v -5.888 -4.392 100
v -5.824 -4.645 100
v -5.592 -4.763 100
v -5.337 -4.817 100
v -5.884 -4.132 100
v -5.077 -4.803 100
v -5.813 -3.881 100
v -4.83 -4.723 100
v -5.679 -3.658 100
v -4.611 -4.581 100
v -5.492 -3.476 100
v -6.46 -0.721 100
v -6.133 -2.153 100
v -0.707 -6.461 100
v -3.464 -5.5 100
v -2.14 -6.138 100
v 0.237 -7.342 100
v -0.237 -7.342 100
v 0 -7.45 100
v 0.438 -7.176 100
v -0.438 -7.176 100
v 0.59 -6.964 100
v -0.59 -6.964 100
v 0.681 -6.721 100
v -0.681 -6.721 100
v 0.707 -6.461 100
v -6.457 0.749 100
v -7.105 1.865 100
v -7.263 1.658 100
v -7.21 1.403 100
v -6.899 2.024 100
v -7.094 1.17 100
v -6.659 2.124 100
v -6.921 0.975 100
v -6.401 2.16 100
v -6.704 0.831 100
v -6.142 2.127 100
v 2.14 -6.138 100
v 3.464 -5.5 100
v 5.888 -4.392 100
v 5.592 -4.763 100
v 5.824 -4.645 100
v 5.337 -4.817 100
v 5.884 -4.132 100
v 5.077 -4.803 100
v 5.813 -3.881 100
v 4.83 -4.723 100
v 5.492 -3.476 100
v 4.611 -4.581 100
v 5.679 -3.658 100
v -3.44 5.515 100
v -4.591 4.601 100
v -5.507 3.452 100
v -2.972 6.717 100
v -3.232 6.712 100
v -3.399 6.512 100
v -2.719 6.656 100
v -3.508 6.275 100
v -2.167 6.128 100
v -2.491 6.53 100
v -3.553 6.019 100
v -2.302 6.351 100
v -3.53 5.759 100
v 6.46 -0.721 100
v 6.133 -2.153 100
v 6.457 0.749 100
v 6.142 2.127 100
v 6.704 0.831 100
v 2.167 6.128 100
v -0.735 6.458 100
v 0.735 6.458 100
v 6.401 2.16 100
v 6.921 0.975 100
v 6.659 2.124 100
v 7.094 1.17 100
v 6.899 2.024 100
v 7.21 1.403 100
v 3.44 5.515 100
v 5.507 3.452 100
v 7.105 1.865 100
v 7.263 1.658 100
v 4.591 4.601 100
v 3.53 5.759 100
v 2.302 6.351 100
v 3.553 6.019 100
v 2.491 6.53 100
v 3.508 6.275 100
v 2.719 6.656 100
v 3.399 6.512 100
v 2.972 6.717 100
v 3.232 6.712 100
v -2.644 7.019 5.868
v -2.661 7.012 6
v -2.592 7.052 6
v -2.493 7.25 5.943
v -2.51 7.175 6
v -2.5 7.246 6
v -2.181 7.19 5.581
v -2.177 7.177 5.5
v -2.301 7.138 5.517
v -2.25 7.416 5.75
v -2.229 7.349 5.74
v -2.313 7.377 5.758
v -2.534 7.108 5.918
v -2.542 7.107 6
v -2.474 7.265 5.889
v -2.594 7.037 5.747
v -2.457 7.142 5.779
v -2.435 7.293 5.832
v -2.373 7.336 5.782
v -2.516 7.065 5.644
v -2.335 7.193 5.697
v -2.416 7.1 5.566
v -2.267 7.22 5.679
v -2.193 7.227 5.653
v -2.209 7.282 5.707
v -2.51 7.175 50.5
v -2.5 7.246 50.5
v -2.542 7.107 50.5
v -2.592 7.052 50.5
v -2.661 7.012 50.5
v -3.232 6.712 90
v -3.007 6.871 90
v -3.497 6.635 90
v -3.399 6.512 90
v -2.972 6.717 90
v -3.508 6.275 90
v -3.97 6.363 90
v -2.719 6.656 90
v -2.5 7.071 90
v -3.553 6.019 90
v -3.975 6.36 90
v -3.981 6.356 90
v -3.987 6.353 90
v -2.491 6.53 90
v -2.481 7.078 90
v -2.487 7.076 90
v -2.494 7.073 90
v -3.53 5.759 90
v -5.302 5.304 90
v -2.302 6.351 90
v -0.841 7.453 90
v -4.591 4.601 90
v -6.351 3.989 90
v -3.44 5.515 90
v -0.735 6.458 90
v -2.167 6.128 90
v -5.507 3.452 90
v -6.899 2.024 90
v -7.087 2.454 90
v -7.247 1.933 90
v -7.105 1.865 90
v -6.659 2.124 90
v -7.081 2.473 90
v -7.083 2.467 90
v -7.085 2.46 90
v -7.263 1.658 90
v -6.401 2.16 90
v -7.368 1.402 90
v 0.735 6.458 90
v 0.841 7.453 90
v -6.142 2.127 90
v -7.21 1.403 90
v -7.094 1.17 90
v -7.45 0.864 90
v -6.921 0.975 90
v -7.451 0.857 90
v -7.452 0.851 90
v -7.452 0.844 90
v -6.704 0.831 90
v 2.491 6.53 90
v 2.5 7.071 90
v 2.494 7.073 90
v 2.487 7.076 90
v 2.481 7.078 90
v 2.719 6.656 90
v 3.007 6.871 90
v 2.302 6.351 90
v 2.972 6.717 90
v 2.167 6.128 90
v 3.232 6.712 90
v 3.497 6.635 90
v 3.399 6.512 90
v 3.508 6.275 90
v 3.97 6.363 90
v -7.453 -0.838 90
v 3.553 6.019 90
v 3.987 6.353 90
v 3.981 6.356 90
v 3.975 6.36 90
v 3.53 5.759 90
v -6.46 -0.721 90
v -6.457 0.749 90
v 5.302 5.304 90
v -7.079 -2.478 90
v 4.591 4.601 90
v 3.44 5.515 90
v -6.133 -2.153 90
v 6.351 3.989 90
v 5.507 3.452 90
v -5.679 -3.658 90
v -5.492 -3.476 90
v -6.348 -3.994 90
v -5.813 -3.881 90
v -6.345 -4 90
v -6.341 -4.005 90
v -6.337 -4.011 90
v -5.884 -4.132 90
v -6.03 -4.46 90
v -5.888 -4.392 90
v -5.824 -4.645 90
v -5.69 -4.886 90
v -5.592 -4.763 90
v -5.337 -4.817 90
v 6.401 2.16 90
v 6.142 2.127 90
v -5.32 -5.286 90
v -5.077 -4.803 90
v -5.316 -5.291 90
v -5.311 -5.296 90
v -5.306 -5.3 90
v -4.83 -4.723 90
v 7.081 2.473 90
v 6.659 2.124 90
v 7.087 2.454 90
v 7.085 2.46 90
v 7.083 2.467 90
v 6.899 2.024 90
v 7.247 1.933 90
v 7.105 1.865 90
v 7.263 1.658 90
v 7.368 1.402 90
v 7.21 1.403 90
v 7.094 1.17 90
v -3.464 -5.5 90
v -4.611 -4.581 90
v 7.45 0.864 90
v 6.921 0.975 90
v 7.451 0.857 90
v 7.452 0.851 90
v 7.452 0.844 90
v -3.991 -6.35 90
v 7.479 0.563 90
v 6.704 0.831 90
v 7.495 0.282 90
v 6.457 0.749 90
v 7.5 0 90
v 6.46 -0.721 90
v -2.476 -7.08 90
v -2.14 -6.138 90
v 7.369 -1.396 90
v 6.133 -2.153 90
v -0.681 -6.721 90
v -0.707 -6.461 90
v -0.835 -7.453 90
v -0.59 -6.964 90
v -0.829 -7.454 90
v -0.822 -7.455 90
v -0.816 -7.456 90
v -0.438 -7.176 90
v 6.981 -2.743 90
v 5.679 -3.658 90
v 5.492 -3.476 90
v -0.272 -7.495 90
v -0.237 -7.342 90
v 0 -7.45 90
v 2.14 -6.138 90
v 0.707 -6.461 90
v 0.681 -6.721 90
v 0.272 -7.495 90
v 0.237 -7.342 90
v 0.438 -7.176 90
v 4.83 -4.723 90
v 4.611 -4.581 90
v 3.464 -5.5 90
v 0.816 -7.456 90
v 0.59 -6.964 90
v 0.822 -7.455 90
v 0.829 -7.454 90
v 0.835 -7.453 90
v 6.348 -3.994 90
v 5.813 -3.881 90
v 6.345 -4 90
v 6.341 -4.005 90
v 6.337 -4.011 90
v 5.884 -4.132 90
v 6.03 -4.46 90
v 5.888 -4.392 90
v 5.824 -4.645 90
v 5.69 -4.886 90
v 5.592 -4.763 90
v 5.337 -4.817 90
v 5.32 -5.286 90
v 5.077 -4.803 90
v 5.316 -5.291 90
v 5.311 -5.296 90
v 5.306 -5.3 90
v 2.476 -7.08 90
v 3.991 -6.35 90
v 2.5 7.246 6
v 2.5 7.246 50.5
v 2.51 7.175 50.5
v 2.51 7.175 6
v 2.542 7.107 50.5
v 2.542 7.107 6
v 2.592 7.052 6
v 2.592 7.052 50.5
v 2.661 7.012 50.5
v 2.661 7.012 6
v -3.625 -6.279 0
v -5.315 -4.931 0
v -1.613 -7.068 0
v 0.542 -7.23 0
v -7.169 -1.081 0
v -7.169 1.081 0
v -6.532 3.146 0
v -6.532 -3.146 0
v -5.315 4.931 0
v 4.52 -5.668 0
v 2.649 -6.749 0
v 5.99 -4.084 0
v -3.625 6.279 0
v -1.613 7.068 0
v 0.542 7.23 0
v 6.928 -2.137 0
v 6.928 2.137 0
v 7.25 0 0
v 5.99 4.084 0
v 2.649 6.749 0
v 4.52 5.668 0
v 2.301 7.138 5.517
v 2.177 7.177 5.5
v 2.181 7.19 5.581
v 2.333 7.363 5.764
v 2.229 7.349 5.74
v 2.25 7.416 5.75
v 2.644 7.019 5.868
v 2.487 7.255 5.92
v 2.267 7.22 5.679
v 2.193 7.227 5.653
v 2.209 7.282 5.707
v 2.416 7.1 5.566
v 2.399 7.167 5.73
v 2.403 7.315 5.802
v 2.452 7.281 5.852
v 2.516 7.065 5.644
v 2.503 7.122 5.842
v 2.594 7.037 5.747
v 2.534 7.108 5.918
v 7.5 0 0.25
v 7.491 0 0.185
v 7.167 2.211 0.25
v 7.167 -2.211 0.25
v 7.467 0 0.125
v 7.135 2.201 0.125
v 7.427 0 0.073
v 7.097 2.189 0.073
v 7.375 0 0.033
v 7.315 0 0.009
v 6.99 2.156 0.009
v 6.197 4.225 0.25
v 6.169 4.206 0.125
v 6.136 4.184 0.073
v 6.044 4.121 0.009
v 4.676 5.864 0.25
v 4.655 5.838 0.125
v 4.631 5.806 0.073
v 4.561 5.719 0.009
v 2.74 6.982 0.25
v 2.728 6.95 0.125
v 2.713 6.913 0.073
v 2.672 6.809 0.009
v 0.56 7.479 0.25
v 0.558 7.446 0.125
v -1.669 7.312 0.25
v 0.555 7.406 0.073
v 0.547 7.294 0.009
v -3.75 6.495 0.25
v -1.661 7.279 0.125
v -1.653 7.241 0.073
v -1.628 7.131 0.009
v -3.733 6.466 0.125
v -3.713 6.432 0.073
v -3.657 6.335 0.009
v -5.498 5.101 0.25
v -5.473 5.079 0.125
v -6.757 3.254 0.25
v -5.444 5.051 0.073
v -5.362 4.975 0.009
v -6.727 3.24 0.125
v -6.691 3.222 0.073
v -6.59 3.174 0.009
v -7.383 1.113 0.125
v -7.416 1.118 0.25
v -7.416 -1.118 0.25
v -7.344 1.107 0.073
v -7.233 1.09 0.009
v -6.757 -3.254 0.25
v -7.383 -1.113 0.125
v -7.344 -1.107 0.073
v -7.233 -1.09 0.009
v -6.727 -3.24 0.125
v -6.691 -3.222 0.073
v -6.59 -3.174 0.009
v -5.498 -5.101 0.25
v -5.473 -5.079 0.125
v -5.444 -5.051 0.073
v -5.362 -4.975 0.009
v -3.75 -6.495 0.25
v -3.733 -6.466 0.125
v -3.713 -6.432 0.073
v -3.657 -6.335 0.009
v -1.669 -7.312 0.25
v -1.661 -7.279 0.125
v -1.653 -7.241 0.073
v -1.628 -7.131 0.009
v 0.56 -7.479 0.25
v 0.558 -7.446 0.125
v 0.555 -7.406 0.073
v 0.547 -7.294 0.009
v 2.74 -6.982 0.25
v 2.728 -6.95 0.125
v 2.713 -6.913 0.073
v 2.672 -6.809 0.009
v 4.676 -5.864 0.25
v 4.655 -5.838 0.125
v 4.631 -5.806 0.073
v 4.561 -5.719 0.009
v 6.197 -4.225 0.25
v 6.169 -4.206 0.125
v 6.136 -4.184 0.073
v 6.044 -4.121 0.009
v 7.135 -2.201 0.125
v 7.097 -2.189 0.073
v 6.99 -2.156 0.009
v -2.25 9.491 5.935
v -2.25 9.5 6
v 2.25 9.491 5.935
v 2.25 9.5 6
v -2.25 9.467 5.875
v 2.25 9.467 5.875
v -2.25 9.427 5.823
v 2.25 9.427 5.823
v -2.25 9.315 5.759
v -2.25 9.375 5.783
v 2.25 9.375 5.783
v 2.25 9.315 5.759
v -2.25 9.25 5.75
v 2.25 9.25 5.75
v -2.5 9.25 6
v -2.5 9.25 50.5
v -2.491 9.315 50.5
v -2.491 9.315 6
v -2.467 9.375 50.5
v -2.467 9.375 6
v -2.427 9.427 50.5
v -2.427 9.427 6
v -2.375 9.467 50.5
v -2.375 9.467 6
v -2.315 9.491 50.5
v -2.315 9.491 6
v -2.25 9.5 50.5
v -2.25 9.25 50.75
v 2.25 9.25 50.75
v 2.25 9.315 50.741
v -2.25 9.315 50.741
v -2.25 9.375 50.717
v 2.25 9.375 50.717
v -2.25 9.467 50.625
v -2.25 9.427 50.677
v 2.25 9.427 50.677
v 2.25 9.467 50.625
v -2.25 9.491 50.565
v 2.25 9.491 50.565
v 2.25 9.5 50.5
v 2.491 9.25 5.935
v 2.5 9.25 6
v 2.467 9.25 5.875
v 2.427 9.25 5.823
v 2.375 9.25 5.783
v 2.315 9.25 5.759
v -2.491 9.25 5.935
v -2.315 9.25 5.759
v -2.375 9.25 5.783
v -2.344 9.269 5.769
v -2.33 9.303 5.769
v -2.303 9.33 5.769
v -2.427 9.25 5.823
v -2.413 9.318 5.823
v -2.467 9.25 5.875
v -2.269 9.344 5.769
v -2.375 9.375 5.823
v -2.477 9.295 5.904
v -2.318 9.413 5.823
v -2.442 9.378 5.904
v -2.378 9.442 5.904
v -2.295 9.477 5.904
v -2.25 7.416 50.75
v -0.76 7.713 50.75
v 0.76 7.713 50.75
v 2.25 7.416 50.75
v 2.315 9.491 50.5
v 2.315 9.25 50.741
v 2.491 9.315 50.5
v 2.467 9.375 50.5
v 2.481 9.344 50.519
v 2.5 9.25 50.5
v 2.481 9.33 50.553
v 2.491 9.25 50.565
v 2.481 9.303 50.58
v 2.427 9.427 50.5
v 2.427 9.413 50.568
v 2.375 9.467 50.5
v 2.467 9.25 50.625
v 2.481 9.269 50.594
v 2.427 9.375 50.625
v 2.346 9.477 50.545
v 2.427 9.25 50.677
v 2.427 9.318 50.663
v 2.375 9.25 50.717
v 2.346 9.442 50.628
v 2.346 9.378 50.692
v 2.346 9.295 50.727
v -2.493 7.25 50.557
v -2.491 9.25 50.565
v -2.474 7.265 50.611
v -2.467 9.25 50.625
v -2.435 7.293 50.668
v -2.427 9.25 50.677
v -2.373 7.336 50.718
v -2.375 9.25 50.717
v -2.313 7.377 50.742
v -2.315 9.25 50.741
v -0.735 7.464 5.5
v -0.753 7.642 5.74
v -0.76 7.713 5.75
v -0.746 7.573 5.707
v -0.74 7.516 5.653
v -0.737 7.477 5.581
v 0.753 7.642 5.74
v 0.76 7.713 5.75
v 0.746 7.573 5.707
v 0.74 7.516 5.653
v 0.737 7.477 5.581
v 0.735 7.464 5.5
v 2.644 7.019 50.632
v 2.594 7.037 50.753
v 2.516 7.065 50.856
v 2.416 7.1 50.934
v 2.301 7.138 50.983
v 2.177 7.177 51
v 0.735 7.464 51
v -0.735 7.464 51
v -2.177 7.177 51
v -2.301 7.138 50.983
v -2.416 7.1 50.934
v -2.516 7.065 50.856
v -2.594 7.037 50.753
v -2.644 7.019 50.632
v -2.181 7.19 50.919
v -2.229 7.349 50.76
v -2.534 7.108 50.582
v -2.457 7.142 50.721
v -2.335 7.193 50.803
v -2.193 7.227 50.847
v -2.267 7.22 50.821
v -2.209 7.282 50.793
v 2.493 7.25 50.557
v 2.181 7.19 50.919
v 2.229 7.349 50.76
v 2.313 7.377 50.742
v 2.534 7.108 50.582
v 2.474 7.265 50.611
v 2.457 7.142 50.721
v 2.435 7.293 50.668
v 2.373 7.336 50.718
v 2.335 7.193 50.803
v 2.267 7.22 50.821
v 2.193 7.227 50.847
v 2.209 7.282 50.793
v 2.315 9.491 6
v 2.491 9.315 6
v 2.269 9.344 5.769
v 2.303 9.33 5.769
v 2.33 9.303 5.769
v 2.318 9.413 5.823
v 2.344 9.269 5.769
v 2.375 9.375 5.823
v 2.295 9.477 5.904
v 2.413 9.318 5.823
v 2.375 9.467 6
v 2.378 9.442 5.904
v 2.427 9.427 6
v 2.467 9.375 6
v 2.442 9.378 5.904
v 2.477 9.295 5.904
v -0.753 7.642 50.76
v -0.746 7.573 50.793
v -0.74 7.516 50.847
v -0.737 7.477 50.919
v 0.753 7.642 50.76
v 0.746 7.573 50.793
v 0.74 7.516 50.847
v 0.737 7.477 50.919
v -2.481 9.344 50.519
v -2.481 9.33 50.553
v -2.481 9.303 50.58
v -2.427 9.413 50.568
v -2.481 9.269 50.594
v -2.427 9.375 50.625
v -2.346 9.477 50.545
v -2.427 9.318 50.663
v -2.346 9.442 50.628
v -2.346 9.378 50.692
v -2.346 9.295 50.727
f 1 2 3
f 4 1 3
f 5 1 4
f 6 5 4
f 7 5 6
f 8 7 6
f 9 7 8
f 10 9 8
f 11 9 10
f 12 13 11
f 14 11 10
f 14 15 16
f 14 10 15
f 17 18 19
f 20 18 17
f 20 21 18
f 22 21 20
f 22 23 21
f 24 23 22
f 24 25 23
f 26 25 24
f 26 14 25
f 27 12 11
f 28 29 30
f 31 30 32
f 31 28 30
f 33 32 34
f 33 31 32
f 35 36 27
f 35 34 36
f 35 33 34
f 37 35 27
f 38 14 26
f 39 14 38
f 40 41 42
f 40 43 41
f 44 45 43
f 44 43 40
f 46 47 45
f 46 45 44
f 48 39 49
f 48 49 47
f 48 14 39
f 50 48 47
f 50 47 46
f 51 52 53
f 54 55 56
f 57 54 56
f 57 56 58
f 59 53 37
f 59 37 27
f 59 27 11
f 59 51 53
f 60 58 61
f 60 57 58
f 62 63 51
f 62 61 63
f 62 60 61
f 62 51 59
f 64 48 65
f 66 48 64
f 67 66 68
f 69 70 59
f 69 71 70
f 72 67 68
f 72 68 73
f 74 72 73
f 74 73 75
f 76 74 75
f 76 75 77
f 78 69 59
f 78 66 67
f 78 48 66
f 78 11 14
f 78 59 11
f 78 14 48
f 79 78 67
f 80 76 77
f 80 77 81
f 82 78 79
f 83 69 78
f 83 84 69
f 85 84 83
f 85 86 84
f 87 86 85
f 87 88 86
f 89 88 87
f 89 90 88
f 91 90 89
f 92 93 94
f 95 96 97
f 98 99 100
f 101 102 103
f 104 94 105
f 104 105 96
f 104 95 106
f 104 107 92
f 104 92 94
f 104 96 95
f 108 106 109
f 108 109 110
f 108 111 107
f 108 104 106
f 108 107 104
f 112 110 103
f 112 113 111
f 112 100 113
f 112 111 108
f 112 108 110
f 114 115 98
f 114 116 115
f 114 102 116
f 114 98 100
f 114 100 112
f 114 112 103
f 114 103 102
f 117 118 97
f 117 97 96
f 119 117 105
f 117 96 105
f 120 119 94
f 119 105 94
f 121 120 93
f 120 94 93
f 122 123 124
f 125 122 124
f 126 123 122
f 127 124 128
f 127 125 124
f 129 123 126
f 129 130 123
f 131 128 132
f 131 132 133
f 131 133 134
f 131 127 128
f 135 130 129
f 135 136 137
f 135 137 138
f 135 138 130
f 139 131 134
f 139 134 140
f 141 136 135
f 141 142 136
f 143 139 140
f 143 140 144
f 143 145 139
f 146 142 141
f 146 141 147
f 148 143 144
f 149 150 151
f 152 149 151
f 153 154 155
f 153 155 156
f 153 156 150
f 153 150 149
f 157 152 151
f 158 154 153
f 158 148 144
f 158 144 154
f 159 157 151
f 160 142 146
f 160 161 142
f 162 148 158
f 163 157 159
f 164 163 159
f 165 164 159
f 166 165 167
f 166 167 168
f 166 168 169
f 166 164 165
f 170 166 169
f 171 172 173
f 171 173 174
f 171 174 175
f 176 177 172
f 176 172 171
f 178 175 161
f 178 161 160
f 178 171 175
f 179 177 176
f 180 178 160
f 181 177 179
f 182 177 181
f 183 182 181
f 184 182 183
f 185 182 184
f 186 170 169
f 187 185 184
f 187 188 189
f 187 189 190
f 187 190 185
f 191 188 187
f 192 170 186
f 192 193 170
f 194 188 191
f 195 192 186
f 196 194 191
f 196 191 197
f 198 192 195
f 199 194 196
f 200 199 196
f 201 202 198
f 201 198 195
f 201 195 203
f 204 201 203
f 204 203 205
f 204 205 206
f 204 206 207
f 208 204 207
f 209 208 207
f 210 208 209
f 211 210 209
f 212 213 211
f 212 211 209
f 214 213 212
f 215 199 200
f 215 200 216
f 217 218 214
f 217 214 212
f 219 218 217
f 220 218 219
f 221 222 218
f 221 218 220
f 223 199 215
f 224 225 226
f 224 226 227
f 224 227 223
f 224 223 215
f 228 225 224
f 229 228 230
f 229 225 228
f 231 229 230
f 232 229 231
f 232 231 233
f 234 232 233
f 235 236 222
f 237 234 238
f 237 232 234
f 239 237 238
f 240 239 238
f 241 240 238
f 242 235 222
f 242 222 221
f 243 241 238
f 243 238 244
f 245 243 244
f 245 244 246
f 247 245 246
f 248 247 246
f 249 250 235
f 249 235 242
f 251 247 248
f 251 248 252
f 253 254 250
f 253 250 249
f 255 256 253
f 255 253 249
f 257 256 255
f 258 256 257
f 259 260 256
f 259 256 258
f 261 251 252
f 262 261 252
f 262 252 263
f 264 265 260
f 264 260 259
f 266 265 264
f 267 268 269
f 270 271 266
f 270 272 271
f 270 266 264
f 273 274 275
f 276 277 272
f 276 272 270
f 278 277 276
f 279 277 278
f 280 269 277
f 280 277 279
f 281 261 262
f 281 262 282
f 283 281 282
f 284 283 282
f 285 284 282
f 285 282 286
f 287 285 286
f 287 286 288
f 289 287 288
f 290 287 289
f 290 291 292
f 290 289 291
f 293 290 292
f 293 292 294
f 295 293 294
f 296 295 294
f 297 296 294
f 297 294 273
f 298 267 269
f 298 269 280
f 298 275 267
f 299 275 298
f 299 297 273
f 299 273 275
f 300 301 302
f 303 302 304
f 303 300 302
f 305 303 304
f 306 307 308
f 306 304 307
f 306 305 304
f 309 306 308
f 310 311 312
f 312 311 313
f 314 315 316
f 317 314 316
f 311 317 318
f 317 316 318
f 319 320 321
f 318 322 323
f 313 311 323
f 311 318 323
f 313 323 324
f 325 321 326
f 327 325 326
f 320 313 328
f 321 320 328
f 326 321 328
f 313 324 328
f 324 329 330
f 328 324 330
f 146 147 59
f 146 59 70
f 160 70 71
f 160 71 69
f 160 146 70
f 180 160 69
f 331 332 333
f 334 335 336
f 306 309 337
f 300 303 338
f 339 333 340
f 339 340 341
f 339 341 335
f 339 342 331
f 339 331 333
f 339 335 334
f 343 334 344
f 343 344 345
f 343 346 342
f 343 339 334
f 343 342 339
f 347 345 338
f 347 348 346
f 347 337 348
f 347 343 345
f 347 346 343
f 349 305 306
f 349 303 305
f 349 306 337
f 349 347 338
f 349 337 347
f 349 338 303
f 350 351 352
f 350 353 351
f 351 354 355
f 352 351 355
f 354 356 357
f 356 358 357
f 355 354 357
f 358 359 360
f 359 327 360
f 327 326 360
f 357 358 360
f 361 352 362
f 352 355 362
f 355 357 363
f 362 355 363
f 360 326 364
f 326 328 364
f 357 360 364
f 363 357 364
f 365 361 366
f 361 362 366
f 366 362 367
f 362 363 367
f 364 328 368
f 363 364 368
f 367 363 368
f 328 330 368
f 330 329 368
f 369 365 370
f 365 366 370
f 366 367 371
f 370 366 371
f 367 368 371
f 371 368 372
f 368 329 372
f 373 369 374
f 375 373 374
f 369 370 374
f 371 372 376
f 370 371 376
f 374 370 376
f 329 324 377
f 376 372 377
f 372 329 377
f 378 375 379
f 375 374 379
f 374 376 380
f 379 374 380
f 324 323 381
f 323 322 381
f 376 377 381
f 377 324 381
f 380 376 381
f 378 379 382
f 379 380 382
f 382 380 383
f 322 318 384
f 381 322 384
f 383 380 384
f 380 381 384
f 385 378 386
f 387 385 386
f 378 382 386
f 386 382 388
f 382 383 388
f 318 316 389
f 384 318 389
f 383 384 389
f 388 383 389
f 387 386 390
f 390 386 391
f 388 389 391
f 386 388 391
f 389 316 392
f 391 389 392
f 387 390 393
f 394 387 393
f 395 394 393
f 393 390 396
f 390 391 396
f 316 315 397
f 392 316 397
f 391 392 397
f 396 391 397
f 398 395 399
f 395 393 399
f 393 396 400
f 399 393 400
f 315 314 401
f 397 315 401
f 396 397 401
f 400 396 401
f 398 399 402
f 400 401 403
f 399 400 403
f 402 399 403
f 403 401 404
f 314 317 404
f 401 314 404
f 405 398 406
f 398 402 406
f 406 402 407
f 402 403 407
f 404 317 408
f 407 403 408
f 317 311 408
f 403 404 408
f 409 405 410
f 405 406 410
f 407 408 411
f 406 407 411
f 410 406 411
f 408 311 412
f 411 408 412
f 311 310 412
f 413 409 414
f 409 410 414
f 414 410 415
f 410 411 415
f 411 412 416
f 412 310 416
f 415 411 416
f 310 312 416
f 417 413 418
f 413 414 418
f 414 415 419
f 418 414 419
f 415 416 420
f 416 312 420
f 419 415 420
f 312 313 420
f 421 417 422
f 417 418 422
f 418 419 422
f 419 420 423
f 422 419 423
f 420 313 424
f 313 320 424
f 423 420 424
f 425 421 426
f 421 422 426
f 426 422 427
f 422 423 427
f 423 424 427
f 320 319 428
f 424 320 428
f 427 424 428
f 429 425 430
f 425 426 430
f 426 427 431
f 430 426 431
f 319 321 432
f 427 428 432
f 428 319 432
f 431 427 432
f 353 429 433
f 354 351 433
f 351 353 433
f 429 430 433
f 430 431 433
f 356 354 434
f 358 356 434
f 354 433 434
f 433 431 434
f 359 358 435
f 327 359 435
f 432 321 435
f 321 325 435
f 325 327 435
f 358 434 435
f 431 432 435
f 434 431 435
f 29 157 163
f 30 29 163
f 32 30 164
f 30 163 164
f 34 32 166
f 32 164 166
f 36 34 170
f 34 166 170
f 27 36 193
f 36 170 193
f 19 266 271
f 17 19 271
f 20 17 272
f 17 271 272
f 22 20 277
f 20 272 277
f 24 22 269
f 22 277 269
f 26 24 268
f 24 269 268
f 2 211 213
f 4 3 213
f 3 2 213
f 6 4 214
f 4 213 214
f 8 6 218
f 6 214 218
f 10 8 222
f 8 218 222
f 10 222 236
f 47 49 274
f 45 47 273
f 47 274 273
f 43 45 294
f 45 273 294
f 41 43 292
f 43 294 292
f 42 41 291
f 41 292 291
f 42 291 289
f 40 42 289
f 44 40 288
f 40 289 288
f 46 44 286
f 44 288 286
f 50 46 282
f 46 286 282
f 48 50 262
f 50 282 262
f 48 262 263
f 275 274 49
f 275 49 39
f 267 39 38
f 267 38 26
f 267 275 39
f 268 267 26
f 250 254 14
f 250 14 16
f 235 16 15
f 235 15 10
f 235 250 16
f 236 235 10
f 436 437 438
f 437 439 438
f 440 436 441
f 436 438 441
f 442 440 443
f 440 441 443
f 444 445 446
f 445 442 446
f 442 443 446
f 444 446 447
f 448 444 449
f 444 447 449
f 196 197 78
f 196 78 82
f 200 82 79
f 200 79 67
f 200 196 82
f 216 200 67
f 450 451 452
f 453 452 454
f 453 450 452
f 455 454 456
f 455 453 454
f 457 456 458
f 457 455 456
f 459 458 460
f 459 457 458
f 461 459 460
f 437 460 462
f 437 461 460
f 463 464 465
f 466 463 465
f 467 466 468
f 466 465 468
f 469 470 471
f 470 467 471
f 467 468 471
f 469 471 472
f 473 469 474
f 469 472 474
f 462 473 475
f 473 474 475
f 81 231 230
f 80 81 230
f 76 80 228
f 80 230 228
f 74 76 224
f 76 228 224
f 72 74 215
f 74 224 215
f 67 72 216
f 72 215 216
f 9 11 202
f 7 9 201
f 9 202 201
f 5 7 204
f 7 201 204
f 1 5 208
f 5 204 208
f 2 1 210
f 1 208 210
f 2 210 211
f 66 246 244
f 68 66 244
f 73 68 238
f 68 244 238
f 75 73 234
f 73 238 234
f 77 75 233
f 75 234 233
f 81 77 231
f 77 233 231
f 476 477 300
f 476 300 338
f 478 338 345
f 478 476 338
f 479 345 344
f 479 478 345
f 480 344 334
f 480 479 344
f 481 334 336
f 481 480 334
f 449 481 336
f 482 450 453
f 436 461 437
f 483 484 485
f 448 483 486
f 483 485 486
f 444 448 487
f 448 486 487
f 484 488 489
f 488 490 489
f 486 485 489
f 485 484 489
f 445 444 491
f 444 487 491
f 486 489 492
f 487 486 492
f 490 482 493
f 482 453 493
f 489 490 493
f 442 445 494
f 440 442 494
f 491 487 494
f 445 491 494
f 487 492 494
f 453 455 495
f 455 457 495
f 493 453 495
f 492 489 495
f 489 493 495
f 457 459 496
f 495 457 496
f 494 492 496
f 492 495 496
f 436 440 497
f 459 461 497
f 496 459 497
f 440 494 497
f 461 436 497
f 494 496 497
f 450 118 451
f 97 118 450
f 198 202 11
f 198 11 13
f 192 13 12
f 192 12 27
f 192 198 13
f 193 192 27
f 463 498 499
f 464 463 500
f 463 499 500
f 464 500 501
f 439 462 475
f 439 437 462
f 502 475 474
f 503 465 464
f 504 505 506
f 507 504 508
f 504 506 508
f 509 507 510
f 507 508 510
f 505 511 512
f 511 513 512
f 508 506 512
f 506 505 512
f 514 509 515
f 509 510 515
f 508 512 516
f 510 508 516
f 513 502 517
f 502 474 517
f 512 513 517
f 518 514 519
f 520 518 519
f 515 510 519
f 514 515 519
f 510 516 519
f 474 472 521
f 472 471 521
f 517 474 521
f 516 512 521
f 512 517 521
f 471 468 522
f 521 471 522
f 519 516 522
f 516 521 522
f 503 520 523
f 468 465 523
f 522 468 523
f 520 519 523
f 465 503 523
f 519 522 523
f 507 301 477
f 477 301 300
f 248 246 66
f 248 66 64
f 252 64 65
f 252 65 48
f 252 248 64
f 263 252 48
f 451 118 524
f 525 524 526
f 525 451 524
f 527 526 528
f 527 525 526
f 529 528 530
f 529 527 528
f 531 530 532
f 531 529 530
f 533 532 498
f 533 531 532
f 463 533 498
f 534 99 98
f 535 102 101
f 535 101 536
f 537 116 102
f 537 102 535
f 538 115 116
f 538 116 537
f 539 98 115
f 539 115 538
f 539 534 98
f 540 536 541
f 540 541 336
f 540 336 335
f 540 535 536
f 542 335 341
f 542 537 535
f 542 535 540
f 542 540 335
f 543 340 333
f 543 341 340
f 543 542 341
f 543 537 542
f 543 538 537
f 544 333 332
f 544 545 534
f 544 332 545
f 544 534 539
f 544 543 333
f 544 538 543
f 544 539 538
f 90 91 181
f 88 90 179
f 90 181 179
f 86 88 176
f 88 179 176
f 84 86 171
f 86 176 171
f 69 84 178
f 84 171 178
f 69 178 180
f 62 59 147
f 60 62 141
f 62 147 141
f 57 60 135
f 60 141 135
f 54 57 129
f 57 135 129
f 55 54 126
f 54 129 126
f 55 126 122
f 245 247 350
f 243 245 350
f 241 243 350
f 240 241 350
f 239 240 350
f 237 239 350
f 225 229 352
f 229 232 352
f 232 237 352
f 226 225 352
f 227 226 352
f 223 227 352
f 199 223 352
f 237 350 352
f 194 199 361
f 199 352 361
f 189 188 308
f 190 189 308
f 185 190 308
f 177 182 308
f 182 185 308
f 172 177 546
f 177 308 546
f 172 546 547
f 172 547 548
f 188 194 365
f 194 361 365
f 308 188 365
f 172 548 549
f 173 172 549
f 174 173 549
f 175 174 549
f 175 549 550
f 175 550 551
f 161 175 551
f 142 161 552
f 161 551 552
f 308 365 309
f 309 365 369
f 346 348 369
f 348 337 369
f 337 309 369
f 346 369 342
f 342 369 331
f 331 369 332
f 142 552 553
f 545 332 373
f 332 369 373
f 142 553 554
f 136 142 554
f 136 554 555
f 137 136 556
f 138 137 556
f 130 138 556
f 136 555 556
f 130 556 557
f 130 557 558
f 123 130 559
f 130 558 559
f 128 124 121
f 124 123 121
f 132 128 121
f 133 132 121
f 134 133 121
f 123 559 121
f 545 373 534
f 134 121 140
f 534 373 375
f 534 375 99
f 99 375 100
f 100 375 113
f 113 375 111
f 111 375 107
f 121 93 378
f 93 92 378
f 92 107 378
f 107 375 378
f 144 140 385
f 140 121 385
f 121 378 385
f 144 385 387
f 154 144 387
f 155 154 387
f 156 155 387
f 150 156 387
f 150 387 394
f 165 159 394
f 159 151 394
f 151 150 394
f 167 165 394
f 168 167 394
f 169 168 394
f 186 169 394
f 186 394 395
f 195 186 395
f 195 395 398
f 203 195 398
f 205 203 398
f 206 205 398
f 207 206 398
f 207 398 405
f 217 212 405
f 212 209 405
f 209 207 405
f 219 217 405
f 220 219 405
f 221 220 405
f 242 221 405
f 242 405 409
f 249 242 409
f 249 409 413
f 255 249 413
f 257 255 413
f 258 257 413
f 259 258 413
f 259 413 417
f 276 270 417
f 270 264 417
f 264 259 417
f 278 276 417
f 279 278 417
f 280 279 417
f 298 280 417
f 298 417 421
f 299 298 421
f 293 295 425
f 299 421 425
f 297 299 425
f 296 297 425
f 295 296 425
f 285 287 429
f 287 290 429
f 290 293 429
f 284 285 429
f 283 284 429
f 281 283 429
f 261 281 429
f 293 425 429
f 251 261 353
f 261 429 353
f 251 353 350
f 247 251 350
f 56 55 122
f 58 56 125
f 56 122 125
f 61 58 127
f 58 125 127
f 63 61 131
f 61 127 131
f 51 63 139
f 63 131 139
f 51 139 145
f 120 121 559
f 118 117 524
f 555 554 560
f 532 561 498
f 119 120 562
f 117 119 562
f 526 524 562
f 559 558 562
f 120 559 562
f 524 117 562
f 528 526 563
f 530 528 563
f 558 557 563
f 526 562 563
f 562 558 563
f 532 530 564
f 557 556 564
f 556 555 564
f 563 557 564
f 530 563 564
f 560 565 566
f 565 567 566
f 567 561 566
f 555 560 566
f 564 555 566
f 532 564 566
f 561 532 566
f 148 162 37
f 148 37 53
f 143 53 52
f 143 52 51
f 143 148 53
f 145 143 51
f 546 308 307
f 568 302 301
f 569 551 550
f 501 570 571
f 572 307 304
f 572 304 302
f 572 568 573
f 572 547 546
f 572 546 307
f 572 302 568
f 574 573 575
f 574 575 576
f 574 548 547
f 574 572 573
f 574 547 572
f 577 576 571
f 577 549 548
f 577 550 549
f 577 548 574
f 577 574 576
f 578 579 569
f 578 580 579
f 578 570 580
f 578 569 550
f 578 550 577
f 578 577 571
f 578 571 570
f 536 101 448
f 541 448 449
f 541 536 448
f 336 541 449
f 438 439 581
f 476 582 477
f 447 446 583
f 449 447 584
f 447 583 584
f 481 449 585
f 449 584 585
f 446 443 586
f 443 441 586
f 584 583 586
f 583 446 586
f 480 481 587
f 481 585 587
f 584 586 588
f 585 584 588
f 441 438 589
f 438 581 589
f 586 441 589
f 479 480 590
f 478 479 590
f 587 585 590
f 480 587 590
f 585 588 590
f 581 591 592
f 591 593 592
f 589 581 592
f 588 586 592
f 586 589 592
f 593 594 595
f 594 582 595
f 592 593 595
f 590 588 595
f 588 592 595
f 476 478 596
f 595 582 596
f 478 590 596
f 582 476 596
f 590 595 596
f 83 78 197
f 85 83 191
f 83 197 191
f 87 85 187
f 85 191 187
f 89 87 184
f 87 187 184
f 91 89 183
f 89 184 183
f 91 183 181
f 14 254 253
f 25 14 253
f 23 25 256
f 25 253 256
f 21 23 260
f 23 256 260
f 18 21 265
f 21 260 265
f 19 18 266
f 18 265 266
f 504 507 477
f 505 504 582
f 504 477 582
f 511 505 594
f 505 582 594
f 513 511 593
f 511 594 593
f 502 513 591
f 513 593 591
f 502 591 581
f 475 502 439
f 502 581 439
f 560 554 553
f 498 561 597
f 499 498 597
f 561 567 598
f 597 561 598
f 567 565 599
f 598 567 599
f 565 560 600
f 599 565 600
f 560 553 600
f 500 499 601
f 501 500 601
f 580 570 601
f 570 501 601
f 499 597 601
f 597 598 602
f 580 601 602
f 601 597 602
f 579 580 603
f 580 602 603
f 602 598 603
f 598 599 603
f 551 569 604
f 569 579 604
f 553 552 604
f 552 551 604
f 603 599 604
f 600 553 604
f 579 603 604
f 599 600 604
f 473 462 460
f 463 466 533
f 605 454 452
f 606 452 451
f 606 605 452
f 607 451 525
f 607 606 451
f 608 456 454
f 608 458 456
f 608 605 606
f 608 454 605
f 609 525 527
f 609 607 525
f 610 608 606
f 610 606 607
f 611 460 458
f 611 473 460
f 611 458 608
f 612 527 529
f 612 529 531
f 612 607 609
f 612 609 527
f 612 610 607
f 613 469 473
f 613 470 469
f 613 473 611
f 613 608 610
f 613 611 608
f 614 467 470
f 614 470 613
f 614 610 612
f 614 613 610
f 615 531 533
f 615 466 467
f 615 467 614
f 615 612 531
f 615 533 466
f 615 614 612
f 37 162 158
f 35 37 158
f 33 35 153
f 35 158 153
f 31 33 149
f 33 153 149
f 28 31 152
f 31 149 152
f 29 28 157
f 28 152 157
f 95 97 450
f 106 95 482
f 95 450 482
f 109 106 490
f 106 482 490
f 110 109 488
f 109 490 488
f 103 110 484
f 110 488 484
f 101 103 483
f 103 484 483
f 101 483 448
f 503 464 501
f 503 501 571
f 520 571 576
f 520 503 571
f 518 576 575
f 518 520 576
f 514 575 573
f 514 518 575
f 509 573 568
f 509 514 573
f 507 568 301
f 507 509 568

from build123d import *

# Parameters (mm, degrees)
SKETCH1_R                = 7.5
BOSS_EXTRUDE1_DEPTH      = 100
SKETCH2_W                = 5
SKETCH2_H                = 45
BOSS_EXTRUDE3_DEPTH      = 9.5
CUT_EXTRUDE1_START       = -10
CUT_EXTRUDE1_DEPTH       = 10
FILLET1_R                = 1
CIRPATTERN8_COUNT        = 7
FILLET1_OF_CIRPATTERN8_R = 1
FILLET3_R                = 0.25


with BuildPart() as part:
    # Sketch1 → Boss-Extrude1 (new body)
    with BuildSketch(Plane.XY):
        Circle(SKETCH1_R)
    extrude(amount=BOSS_EXTRUDE1_DEPTH)

    # Sketch2 → Boss-Extrude3 (add)
    with BuildSketch(Plane(origin=(0, 0, 0), x_dir=(1, 0, 0), z_dir=(0, 1, 0))):
        with Locations((0, -28.25)):
            Rectangle(SKETCH2_W, SKETCH2_H)
    extrude(amount=BOSS_EXTRUDE3_DEPTH)

    # Sketch3 → Cut-Extrude1 (cut)
    with BuildSketch(Plane.XY.offset(100).offset(CUT_EXTRUDE1_START)):
        with BuildLine():
            ThreePointArc((2.5, 7.071067812), (0, 7.5), (-2.5, 7.071067812))
            Line((-2.5, 7.071067812), (-2.166666667, 6.12825877))
            ThreePointArc((-2.166666667, 6.12825877), (0, 6.5), (2.166666667, 6.12825877))
            Line((2.166666667, 6.12825877), (2.5, 7.071067812))
        make_face()
    cut_extrude1 = extrude(amount=CUT_EXTRUDE1_DEPTH, mode=Mode.SUBTRACT)

    # Fillet1
    # the kernel refuses this fillet: 1 mm, written as the material it takes off along each edge
    with BuildSketch(Plane(origin=(2.5, 7.071067812, 90), x_dir=(0.9143745015294013, -0.4048694492708226, 0), z_dir=(0, 0, 1))) as fillet1_piece_1:
        with BuildLine():
            CenterArc((1.076923077, -0.997037031), FILLET1_R, 85.588274214, 94.411725786)
            Line((0.076923077, -0.997037031), (0.056923077, -0.997037031))
            ThreePointArc((0.056923077, -0.997037031), (0.018520798, -0.500056977), (-0.019940741, -0.001538462))
            Line((-0.019940741, -0.001538462), (-0.001538462, 0.019940741))
            ThreePointArc((-0.001538462, 0.019940741), (0.576923077, 0.042222271), (1.155384615, 0.019940741))
            Line((1.155384615, 0.019940741), (1.153846154, 0))
        make_face()
    extrude(amount=12.884615385, mode=Mode.SUBTRACT)
    with BuildSketch(Plane(origin=(-2.5, 7.071067812, 90), x_dir=(-0.9143745015294016, -0.40486944927082136, 0), z_dir=(0, 0, 1))) as fillet1_piece_2:
        with BuildLine():
            CenterArc((1.076923077, 0.997037031), FILLET1_R, 180, 94.411725786)
            Line((0.076923077, 0.997037031), (0.056923077, 0.997037031))
            ThreePointArc((0.056923077, 0.997037031), (0.018520798, 0.500056977), (-0.019940741, 0.001538462))
            Line((-0.019940741, 0.001538462), (-0.001538462, -0.019940741))
            ThreePointArc((-0.001538462, -0.019940741), (0.576923077, -0.042222271), (1.155384615, -0.019940741))
            Line((1.155384615, -0.019940741), (1.153846154, 0))
        make_face()
    extrude(amount=12.884615385, mode=Mode.SUBTRACT)

    # CirPattern8: Cut-Extrude1 ×7 about axis
    cirpattern8_axis = Axis((0, 0, 0), (0, 0, 1))
    for i in range(1, CIRPATTERN8_COUNT):
        add(cut_extrude1.rotate(cirpattern8_axis, i * 360 / CIRPATTERN8_COUNT), mode=Mode.SUBTRACT)

    # Fillet1 of CirPattern8
    # the kernel refuses this fillet: 1 mm, written as the material it takes off along each edge
    with BuildSketch(Plane(origin=(-3.969658925, 6.363317375, 90), x_dir=(0.8866428585126668, 0.4624547993571771, 0), z_dir=(0, 0, 1)), Plane(origin=(-7.450083714, 0.863859167, 90), x_dir=(0.19125105881764654, 0.9815411517104767, 0), z_dir=(0, 0, 1)), Plane(origin=(-5.320443512, -5.286102614, 90), x_dir=(-0.6481566889776921, 0.7615069970351391, 0), z_dir=(0, 0, 1)), Plane(origin=(0.815599172, -7.455521309, 90), x_dir=(-0.9994892299858744, -0.031957458319521785, 0), z_dir=(0, 0, 1)), Plane(origin=(6.337479044, -4.010780394, 90), x_dir=(-0.5981859949499692, -0.8013572957462329, 0), z_dir=(0, 0, 1)), Plane(origin=(7.087107935, 2.454159963, 90), x_dir=(0.25356349505382336, -0.9673187447662169, 0), z_dir=(0, 0, 1))) as fillet1_of_cirpattern8_piece_1:
        with BuildLine():
            CenterArc((1.076923077, -0.997037031), FILLET1_OF_CIRPATTERN8_R, 85.588274214, 94.411725786)
            Line((0.076923077, -0.997037031), (0.056923077, -0.997037031))
            ThreePointArc((0.056923077, -0.997037031), (0.018520798, -0.500056977), (-0.019940741, -0.001538462))
            Line((-0.019940741, -0.001538462), (-0.001538462, 0.019940741))
            ThreePointArc((-0.001538462, 0.019940741), (0.576923077, 0.042222271), (1.155384615, 0.019940741))
            Line((1.155384615, 0.019940741), (1.153846154, 0))
        make_face()
    extrude(amount=12.884615385, mode=Mode.SUBTRACT)
    with BuildSketch(Plane(origin=(-7.087107935, 2.454159963, 90), x_dir=(-0.25356349505382375, -0.9673187447662169, 0), z_dir=(0, 0, 1)), Plane(origin=(-6.337479044, -4.010780394, 90), x_dir=(0.5981859949499683, -0.8013572957462336, 0), z_dir=(0, 0, 1)), Plane(origin=(-0.815599172, -7.455521309, 90), x_dir=(0.9994892299858742, -0.03195745831952264, 0), z_dir=(0, 0, 1)), Plane(origin=(5.320443512, -5.286102614, 90), x_dir=(0.6481566889776939, 0.7615069970351375, 0), z_dir=(0, 0, 1)), Plane(origin=(7.450083714, 0.863859167, 90), x_dir=(-0.1912510588176455, 0.981541151710477, 0), z_dir=(0, 0, 1)), Plane(origin=(3.969658925, 6.363317375, 90), x_dir=(-0.8866428585126658, 0.46245479935717904, 0), z_dir=(0, 0, 1))) as fillet1_of_cirpattern8_piece_2:
        with BuildLine():
            CenterArc((1.076923077, 0.997037031), FILLET1_OF_CIRPATTERN8_R, 180, 94.411725786)
            Line((0.076923077, 0.997037031), (0.056923077, 0.997037031))
            ThreePointArc((0.056923077, 0.997037031), (0.018520798, 0.500056977), (-0.019940741, 0.001538462))
            Line((-0.019940741, 0.001538462), (-0.001538462, -0.019940741))
            ThreePointArc((-0.001538462, -0.019940741), (0.576923077, -0.042222271), (1.155384615, -0.019940741))
            Line((1.155384615, -0.019940741), (1.153846154, 0))
        make_face()
    extrude(amount=12.884615385, mode=Mode.SUBTRACT)

    # Fillet3
    fillet3_edges = [part.edges().sort_by_distance(p)[0] for p in [
        (0, 9.5, 50.75),
        (-2.5, 9.5, 28.25),
        (-7.5, 0, 0),
        (-2.5, 7.071067812, 28.25),
        (0, 7.5, 5.75),
        (2.5, 7.071067812, 28.25),
        (0, 7.5, 50.75),
        (2.5, 9.5, 28.25),
        (2.5, 8.285533906, 50.75),
        (-2.5, 8.285533906, 5.75),
        (-2.5, 8.285533906, 50.75),
        (0, 9.5, 5.75),
        (2.5, 8.285533906, 5.75),
    ]]
    fillet(fillet3_edges, radius=FILLET3_R)


solid = part.part
